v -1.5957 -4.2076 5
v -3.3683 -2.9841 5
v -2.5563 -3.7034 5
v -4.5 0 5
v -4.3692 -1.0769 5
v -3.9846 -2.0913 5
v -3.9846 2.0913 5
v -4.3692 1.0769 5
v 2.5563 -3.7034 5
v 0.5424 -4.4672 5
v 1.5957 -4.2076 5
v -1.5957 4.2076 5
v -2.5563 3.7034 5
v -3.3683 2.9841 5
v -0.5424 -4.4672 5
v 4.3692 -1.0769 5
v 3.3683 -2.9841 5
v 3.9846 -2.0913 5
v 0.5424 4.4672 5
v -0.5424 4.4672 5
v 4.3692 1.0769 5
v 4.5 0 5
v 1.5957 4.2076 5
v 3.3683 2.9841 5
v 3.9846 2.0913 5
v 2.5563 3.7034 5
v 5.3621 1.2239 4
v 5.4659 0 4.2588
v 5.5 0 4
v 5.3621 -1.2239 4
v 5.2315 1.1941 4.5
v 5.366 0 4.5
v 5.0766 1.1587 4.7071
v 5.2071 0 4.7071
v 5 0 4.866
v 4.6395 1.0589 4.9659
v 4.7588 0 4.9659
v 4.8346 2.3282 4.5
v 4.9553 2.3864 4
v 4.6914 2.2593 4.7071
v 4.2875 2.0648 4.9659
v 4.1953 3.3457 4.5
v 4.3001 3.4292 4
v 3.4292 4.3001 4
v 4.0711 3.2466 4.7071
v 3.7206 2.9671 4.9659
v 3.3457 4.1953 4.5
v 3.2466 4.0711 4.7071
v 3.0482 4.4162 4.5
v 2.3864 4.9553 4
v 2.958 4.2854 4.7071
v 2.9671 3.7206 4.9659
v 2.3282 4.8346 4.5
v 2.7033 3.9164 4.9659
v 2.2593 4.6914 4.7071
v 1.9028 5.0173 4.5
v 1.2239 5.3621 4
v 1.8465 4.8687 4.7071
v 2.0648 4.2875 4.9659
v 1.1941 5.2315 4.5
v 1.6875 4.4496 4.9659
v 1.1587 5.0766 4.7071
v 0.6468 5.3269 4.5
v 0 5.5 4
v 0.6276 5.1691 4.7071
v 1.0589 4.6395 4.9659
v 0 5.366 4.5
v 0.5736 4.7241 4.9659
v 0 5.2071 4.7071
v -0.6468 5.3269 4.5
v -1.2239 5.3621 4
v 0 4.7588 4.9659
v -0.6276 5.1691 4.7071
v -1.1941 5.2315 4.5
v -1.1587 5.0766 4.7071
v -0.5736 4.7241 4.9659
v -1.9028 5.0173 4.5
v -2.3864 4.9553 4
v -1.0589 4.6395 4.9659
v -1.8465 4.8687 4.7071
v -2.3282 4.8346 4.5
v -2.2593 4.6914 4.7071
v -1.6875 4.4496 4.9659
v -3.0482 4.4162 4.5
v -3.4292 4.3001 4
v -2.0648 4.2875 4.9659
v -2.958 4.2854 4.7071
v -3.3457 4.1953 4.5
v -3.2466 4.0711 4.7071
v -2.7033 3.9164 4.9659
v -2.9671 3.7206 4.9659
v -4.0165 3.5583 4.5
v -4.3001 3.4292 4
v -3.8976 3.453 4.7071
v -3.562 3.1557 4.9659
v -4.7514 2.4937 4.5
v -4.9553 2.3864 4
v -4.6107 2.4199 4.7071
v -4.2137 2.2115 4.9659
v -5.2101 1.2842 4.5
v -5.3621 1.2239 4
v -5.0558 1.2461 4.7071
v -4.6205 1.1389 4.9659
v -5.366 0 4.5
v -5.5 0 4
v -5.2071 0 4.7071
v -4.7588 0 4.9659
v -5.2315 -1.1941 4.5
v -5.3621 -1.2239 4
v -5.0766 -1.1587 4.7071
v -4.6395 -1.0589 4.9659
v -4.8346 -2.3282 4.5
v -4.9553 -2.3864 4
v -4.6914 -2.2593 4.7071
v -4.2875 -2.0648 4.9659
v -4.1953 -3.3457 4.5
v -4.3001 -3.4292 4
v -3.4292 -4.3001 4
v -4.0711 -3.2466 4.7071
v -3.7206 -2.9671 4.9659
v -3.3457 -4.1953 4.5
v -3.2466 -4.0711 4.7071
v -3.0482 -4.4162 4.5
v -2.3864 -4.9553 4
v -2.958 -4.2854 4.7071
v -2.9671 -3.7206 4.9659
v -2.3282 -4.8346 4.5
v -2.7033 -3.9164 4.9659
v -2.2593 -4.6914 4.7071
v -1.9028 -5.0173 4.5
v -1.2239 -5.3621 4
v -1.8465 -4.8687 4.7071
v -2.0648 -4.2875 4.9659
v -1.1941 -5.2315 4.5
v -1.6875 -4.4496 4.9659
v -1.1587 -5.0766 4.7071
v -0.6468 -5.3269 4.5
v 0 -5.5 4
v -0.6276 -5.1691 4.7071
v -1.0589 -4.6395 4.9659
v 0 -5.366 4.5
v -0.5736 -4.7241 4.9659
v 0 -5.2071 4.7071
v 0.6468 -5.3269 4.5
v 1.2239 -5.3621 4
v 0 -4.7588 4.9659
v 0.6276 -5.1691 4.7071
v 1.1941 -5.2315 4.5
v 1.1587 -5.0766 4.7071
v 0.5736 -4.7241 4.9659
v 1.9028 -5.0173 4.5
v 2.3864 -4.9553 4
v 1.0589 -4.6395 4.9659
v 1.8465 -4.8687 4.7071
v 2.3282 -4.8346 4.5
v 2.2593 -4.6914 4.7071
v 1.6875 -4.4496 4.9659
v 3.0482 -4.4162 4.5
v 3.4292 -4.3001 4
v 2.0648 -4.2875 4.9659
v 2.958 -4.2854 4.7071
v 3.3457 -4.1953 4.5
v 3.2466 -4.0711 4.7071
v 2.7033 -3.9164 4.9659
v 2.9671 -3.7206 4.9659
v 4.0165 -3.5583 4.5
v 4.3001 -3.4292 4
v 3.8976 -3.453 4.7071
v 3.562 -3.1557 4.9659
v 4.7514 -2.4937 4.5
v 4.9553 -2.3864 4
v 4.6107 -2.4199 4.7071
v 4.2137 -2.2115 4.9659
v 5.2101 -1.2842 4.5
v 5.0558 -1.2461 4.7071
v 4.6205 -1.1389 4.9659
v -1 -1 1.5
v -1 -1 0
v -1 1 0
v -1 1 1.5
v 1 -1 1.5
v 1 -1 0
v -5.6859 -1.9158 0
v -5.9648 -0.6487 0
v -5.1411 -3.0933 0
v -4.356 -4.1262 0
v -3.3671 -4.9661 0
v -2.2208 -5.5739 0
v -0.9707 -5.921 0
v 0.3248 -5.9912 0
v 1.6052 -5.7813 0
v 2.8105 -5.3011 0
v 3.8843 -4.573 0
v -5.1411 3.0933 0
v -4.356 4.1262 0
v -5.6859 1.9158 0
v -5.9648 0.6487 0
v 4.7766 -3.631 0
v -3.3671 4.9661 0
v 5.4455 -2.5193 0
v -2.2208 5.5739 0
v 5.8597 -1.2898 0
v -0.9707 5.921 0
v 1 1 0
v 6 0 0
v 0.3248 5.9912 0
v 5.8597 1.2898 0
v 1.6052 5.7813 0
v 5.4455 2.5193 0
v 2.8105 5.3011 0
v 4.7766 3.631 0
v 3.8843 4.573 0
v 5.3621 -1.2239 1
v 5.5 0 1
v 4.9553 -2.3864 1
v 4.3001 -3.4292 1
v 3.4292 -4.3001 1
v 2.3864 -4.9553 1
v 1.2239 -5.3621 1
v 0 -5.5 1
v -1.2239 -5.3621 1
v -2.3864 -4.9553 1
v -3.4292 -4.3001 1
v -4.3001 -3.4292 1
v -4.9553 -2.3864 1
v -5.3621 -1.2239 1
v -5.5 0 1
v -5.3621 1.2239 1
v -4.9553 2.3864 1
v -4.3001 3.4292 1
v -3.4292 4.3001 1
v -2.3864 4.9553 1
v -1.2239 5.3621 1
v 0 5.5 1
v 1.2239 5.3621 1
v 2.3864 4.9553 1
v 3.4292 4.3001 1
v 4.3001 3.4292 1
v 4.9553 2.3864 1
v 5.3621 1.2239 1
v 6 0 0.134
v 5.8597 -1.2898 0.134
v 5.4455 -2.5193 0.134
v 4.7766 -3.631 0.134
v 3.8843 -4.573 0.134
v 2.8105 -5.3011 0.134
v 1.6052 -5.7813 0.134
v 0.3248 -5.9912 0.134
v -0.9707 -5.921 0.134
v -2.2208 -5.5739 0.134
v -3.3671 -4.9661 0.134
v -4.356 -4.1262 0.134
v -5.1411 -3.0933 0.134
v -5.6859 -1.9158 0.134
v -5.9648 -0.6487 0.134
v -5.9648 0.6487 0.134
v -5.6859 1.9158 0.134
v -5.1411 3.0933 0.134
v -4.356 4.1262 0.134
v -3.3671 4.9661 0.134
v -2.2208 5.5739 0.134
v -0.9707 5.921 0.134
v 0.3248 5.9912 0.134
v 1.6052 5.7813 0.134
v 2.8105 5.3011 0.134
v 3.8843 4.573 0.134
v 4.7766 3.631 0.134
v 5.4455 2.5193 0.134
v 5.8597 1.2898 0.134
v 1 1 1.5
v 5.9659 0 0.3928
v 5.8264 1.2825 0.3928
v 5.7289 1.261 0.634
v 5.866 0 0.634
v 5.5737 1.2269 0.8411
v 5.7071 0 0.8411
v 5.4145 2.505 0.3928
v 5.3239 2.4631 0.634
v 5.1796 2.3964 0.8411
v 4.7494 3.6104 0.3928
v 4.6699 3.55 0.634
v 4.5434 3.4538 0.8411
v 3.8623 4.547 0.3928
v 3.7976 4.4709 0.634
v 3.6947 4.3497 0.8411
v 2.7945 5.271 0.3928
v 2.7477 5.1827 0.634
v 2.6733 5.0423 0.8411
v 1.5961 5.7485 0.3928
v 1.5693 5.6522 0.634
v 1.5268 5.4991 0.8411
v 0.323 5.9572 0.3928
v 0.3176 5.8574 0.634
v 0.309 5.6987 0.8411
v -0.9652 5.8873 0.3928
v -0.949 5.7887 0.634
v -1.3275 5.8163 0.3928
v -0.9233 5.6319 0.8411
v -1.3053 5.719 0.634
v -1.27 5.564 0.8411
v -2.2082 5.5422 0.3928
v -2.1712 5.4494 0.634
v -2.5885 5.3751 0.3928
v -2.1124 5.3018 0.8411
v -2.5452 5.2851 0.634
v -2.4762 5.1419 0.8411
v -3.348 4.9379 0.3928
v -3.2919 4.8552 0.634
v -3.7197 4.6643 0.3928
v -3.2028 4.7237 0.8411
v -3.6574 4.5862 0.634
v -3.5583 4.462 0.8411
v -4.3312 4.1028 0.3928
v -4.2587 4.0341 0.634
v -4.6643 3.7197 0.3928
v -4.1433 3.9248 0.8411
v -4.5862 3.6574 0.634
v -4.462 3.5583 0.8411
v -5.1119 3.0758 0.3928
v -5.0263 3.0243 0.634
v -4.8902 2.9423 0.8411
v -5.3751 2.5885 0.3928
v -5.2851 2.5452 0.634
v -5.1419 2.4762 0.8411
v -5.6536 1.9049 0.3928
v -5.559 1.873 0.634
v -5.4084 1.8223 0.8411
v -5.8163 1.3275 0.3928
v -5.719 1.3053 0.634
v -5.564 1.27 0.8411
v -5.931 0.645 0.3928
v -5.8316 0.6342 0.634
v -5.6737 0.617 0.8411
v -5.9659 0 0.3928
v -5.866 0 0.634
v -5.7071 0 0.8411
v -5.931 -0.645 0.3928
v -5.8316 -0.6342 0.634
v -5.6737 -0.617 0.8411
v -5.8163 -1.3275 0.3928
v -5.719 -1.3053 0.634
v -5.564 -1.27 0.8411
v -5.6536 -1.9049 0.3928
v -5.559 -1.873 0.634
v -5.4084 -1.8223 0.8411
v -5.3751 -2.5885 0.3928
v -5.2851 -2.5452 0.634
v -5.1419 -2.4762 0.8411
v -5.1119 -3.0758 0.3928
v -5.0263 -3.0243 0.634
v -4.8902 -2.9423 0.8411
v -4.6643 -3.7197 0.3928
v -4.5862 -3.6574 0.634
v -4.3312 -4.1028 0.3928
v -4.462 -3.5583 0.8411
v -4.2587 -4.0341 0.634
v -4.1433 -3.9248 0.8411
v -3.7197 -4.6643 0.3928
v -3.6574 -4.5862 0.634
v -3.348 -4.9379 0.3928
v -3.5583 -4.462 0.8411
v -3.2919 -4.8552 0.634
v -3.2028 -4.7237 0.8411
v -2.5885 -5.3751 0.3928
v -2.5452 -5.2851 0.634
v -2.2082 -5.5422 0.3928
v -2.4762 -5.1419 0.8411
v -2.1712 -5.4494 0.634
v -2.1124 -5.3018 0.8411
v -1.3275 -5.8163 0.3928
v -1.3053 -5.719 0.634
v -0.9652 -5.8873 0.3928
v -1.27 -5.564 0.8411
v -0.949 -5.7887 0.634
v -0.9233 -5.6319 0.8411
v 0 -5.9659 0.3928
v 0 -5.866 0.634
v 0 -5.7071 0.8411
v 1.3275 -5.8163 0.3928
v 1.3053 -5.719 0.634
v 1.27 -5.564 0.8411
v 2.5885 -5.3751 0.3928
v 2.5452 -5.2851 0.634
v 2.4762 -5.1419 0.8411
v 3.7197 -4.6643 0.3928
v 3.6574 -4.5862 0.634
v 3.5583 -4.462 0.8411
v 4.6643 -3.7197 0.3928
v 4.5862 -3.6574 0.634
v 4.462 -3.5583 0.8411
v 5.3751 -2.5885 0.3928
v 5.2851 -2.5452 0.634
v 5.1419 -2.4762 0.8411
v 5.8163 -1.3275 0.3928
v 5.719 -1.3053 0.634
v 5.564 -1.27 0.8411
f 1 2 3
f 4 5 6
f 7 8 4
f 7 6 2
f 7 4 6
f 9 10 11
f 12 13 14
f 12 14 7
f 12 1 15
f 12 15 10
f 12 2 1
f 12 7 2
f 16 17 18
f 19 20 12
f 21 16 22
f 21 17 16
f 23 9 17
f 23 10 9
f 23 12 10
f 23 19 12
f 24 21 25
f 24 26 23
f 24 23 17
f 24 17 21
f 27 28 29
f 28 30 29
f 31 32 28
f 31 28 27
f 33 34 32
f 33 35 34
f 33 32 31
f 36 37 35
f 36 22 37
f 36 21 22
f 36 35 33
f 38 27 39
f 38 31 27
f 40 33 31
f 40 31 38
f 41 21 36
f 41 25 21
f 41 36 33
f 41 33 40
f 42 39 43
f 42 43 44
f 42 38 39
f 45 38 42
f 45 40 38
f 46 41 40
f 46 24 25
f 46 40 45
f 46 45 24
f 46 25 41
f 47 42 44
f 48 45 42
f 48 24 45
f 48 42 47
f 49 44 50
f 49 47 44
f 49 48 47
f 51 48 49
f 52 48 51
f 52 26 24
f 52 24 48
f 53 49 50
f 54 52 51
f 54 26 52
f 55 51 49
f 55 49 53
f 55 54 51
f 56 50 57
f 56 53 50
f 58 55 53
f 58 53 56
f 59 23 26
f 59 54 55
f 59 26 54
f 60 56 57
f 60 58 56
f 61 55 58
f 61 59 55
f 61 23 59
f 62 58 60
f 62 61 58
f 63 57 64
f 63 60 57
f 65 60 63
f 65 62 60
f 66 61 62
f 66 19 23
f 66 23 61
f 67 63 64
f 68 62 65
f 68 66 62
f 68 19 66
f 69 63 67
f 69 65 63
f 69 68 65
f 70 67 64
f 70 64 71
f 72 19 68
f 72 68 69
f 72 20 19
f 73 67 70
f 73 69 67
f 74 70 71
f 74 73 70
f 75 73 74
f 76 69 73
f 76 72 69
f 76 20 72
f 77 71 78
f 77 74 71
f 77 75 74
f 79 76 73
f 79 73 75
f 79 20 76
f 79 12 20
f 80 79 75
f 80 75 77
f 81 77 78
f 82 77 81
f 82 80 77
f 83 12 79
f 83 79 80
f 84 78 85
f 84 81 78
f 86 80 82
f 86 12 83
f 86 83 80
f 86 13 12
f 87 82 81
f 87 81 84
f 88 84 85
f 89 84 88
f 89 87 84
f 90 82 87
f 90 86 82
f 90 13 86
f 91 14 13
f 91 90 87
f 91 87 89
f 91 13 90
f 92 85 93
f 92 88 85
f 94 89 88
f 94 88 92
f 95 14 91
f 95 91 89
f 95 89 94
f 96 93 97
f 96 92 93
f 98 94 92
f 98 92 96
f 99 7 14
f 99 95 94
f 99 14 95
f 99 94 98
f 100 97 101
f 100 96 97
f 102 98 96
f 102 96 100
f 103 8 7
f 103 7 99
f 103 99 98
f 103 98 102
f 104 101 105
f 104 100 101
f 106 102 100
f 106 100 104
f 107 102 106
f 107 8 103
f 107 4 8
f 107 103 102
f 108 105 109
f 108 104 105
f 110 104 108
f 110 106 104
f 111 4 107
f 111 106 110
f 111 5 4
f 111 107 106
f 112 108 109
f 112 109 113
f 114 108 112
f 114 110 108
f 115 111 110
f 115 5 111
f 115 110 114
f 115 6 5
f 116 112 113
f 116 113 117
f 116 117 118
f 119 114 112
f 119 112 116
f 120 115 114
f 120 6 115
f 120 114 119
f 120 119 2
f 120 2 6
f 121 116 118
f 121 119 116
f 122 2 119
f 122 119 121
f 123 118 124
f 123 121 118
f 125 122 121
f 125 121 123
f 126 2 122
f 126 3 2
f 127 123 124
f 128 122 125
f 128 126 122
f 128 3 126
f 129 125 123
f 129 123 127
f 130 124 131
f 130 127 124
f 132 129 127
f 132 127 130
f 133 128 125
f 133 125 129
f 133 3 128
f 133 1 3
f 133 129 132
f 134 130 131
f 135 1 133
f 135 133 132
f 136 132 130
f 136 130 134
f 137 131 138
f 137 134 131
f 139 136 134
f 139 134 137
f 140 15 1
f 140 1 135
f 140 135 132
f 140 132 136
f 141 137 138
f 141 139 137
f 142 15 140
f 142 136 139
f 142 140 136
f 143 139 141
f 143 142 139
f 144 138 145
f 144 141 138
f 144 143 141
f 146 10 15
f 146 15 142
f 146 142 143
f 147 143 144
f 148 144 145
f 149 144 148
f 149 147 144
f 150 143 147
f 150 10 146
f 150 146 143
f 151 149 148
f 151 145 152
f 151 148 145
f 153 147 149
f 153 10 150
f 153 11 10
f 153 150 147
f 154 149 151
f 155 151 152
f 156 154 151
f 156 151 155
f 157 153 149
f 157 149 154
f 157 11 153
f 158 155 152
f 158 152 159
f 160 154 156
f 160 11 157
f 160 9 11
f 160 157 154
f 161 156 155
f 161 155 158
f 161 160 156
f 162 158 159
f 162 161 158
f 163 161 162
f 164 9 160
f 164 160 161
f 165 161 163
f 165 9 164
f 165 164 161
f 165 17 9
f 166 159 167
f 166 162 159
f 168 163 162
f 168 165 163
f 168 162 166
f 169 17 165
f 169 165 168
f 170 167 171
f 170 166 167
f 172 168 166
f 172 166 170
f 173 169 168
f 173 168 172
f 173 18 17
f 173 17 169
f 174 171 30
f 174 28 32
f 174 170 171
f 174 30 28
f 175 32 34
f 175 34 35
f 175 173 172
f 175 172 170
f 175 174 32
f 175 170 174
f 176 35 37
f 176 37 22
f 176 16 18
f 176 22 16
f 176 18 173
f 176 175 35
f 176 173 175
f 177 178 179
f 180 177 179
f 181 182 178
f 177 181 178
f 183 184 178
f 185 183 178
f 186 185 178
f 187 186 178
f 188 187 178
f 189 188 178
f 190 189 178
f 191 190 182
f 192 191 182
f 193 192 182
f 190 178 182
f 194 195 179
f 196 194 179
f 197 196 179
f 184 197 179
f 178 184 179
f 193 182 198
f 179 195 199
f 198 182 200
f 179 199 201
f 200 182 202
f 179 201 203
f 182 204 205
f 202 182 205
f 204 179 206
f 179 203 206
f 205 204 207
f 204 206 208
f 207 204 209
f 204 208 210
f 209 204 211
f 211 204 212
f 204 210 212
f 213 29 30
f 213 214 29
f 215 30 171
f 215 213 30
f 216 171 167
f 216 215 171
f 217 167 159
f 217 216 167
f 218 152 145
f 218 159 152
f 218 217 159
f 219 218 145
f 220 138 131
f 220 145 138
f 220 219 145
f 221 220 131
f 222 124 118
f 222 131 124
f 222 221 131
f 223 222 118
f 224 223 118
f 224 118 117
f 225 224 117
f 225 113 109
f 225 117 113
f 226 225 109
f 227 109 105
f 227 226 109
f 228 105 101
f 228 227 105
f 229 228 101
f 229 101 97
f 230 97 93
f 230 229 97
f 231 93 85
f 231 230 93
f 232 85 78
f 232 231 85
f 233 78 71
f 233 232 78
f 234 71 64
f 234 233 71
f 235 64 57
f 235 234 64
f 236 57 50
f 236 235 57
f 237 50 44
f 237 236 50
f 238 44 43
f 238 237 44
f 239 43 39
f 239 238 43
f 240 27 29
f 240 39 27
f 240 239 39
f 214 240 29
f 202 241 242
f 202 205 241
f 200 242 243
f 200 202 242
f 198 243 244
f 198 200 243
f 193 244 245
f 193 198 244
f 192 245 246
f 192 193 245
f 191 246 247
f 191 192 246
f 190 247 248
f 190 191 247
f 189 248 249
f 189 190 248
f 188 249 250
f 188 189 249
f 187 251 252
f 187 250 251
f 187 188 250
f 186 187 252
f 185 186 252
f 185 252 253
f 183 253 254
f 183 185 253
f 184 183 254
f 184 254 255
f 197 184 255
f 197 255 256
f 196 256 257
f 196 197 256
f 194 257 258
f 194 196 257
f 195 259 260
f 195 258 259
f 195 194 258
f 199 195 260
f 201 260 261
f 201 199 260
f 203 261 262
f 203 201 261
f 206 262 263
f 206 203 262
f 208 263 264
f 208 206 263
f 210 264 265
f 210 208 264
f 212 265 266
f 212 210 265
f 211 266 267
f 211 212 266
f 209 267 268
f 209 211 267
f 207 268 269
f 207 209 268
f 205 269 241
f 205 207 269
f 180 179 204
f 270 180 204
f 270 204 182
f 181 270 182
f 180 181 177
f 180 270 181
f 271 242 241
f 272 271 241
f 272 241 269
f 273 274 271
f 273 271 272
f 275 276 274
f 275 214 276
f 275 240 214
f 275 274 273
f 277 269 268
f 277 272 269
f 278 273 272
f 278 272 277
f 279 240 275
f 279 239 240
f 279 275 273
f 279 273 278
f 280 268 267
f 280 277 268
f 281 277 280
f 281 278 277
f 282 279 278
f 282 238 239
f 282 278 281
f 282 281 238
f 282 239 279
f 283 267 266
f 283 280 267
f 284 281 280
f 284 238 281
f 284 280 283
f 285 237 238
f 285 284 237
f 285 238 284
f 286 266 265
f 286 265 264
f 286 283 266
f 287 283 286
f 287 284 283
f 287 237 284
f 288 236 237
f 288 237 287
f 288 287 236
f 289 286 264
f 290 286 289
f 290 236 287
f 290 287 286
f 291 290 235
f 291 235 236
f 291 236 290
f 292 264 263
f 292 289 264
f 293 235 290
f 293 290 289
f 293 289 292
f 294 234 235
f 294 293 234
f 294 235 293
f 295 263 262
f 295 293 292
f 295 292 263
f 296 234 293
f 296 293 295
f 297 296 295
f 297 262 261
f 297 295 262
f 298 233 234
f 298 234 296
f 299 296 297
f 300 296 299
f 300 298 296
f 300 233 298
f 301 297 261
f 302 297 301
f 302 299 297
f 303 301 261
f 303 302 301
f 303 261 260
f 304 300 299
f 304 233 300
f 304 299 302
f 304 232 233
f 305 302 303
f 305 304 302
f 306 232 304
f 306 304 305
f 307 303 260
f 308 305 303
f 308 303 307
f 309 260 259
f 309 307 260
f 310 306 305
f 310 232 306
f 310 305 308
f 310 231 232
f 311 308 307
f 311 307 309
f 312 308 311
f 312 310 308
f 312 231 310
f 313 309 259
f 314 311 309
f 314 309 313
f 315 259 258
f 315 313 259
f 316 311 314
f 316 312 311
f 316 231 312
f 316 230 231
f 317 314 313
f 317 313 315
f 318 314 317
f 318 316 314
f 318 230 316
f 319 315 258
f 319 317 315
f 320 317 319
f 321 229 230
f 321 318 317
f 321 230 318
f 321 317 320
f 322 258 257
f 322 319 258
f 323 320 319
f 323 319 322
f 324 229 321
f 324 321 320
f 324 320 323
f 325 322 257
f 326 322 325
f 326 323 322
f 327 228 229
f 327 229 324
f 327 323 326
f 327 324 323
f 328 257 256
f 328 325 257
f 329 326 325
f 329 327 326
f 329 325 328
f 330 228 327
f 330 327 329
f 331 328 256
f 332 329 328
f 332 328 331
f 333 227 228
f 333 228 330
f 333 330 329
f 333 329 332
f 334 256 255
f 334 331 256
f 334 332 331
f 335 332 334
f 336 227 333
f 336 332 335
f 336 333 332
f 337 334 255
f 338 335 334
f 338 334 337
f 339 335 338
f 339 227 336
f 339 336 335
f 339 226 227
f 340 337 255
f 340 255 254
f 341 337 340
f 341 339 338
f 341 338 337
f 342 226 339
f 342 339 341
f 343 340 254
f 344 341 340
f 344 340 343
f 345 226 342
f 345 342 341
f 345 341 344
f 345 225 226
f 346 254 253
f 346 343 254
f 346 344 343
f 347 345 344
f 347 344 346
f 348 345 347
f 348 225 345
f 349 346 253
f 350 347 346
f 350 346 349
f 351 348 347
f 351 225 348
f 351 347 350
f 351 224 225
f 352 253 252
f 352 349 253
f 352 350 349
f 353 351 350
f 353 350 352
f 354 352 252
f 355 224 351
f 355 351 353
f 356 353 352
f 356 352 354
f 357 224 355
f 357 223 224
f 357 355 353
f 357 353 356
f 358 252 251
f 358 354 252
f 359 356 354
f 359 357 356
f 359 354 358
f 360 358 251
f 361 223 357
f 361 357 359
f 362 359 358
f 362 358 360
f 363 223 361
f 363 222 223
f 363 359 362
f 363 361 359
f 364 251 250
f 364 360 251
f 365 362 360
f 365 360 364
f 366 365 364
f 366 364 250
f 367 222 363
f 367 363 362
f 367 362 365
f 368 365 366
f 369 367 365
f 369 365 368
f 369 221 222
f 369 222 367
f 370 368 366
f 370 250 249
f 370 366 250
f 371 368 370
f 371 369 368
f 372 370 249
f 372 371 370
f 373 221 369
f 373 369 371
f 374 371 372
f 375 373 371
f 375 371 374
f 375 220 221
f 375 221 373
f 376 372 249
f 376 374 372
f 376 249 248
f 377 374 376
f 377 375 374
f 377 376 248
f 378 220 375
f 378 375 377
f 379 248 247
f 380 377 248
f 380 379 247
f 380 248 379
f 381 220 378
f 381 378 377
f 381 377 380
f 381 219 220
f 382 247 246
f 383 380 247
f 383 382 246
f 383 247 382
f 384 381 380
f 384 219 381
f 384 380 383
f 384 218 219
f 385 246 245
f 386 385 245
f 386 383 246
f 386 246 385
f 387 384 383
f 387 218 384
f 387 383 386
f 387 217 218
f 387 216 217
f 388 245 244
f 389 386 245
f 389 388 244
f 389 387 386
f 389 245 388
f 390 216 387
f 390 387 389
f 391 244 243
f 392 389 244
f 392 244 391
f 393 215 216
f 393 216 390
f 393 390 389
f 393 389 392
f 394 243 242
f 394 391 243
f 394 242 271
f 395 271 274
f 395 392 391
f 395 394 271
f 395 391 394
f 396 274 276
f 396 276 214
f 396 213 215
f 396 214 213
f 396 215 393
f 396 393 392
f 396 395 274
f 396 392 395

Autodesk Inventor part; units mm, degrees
ref_plane "YZ Plane" through (0, 0, 0) normal (1, 0, 0) x (0, 1, 0)
ref_plane "XZ Plane" through (0, 0, 0) normal (0, 1, 0) x (-1, 0, 0)
ref_plane "XY Plane" through (0, 0, 0) normal (0, 0, 1) x (1, 0, 0)
sketch "Sketch1" plane through (0, 0, 0) normal (0, 0, 1) x (1, 0, 0)
  circle A0 centre (0, 0) radius 6
  dimension "d0" = 12
extrude "Extrusion1" add sketch "Sketch1" along normal blind 1
sketch "Sketch2" plane through (0, 0, 1) normal (0, 0, 1) x (1, 0, 0)
  circle A0 centre (0, 0) radius 5.5
  dimension "d3" = 11
extrude "Extrusion2" add sketch "Sketch2" along normal blind 4
fillet "Fillet1" radius 1 1 edges at (-6, 0, 1)
fillet "Fillet2" radius 1 1 edges at (-5.5, 0, 5)
sketch "Sketch3" plane through (0, 0, 0) normal (0, 0, -1) x (-1, 0, 0)
  line L0 (0, -1) -> (1, -1)
  line L1 (1, -1) -> (1, 1)
  line L2 (1, 1) -> (-1, 1)
  line L3 (-1, 1) -> (-1, -1)
  line L4 (-1, -1) -> (0, -1)
  point P0 (0, 0)
  dimension "d8" = 1
  dimension "d9" = 2
  dimension "d10" = 1
  dimension "d13" = 1
extrude "Extrusion3" cut sketch "Sketch3" against normal blind 1.5
sketch "Sketch4" plane through (0, 0, 0) normal (0, 0, -1) x (-1, 0, 0)
  point P0 (0, 0)
properties part number "BTN_3"
